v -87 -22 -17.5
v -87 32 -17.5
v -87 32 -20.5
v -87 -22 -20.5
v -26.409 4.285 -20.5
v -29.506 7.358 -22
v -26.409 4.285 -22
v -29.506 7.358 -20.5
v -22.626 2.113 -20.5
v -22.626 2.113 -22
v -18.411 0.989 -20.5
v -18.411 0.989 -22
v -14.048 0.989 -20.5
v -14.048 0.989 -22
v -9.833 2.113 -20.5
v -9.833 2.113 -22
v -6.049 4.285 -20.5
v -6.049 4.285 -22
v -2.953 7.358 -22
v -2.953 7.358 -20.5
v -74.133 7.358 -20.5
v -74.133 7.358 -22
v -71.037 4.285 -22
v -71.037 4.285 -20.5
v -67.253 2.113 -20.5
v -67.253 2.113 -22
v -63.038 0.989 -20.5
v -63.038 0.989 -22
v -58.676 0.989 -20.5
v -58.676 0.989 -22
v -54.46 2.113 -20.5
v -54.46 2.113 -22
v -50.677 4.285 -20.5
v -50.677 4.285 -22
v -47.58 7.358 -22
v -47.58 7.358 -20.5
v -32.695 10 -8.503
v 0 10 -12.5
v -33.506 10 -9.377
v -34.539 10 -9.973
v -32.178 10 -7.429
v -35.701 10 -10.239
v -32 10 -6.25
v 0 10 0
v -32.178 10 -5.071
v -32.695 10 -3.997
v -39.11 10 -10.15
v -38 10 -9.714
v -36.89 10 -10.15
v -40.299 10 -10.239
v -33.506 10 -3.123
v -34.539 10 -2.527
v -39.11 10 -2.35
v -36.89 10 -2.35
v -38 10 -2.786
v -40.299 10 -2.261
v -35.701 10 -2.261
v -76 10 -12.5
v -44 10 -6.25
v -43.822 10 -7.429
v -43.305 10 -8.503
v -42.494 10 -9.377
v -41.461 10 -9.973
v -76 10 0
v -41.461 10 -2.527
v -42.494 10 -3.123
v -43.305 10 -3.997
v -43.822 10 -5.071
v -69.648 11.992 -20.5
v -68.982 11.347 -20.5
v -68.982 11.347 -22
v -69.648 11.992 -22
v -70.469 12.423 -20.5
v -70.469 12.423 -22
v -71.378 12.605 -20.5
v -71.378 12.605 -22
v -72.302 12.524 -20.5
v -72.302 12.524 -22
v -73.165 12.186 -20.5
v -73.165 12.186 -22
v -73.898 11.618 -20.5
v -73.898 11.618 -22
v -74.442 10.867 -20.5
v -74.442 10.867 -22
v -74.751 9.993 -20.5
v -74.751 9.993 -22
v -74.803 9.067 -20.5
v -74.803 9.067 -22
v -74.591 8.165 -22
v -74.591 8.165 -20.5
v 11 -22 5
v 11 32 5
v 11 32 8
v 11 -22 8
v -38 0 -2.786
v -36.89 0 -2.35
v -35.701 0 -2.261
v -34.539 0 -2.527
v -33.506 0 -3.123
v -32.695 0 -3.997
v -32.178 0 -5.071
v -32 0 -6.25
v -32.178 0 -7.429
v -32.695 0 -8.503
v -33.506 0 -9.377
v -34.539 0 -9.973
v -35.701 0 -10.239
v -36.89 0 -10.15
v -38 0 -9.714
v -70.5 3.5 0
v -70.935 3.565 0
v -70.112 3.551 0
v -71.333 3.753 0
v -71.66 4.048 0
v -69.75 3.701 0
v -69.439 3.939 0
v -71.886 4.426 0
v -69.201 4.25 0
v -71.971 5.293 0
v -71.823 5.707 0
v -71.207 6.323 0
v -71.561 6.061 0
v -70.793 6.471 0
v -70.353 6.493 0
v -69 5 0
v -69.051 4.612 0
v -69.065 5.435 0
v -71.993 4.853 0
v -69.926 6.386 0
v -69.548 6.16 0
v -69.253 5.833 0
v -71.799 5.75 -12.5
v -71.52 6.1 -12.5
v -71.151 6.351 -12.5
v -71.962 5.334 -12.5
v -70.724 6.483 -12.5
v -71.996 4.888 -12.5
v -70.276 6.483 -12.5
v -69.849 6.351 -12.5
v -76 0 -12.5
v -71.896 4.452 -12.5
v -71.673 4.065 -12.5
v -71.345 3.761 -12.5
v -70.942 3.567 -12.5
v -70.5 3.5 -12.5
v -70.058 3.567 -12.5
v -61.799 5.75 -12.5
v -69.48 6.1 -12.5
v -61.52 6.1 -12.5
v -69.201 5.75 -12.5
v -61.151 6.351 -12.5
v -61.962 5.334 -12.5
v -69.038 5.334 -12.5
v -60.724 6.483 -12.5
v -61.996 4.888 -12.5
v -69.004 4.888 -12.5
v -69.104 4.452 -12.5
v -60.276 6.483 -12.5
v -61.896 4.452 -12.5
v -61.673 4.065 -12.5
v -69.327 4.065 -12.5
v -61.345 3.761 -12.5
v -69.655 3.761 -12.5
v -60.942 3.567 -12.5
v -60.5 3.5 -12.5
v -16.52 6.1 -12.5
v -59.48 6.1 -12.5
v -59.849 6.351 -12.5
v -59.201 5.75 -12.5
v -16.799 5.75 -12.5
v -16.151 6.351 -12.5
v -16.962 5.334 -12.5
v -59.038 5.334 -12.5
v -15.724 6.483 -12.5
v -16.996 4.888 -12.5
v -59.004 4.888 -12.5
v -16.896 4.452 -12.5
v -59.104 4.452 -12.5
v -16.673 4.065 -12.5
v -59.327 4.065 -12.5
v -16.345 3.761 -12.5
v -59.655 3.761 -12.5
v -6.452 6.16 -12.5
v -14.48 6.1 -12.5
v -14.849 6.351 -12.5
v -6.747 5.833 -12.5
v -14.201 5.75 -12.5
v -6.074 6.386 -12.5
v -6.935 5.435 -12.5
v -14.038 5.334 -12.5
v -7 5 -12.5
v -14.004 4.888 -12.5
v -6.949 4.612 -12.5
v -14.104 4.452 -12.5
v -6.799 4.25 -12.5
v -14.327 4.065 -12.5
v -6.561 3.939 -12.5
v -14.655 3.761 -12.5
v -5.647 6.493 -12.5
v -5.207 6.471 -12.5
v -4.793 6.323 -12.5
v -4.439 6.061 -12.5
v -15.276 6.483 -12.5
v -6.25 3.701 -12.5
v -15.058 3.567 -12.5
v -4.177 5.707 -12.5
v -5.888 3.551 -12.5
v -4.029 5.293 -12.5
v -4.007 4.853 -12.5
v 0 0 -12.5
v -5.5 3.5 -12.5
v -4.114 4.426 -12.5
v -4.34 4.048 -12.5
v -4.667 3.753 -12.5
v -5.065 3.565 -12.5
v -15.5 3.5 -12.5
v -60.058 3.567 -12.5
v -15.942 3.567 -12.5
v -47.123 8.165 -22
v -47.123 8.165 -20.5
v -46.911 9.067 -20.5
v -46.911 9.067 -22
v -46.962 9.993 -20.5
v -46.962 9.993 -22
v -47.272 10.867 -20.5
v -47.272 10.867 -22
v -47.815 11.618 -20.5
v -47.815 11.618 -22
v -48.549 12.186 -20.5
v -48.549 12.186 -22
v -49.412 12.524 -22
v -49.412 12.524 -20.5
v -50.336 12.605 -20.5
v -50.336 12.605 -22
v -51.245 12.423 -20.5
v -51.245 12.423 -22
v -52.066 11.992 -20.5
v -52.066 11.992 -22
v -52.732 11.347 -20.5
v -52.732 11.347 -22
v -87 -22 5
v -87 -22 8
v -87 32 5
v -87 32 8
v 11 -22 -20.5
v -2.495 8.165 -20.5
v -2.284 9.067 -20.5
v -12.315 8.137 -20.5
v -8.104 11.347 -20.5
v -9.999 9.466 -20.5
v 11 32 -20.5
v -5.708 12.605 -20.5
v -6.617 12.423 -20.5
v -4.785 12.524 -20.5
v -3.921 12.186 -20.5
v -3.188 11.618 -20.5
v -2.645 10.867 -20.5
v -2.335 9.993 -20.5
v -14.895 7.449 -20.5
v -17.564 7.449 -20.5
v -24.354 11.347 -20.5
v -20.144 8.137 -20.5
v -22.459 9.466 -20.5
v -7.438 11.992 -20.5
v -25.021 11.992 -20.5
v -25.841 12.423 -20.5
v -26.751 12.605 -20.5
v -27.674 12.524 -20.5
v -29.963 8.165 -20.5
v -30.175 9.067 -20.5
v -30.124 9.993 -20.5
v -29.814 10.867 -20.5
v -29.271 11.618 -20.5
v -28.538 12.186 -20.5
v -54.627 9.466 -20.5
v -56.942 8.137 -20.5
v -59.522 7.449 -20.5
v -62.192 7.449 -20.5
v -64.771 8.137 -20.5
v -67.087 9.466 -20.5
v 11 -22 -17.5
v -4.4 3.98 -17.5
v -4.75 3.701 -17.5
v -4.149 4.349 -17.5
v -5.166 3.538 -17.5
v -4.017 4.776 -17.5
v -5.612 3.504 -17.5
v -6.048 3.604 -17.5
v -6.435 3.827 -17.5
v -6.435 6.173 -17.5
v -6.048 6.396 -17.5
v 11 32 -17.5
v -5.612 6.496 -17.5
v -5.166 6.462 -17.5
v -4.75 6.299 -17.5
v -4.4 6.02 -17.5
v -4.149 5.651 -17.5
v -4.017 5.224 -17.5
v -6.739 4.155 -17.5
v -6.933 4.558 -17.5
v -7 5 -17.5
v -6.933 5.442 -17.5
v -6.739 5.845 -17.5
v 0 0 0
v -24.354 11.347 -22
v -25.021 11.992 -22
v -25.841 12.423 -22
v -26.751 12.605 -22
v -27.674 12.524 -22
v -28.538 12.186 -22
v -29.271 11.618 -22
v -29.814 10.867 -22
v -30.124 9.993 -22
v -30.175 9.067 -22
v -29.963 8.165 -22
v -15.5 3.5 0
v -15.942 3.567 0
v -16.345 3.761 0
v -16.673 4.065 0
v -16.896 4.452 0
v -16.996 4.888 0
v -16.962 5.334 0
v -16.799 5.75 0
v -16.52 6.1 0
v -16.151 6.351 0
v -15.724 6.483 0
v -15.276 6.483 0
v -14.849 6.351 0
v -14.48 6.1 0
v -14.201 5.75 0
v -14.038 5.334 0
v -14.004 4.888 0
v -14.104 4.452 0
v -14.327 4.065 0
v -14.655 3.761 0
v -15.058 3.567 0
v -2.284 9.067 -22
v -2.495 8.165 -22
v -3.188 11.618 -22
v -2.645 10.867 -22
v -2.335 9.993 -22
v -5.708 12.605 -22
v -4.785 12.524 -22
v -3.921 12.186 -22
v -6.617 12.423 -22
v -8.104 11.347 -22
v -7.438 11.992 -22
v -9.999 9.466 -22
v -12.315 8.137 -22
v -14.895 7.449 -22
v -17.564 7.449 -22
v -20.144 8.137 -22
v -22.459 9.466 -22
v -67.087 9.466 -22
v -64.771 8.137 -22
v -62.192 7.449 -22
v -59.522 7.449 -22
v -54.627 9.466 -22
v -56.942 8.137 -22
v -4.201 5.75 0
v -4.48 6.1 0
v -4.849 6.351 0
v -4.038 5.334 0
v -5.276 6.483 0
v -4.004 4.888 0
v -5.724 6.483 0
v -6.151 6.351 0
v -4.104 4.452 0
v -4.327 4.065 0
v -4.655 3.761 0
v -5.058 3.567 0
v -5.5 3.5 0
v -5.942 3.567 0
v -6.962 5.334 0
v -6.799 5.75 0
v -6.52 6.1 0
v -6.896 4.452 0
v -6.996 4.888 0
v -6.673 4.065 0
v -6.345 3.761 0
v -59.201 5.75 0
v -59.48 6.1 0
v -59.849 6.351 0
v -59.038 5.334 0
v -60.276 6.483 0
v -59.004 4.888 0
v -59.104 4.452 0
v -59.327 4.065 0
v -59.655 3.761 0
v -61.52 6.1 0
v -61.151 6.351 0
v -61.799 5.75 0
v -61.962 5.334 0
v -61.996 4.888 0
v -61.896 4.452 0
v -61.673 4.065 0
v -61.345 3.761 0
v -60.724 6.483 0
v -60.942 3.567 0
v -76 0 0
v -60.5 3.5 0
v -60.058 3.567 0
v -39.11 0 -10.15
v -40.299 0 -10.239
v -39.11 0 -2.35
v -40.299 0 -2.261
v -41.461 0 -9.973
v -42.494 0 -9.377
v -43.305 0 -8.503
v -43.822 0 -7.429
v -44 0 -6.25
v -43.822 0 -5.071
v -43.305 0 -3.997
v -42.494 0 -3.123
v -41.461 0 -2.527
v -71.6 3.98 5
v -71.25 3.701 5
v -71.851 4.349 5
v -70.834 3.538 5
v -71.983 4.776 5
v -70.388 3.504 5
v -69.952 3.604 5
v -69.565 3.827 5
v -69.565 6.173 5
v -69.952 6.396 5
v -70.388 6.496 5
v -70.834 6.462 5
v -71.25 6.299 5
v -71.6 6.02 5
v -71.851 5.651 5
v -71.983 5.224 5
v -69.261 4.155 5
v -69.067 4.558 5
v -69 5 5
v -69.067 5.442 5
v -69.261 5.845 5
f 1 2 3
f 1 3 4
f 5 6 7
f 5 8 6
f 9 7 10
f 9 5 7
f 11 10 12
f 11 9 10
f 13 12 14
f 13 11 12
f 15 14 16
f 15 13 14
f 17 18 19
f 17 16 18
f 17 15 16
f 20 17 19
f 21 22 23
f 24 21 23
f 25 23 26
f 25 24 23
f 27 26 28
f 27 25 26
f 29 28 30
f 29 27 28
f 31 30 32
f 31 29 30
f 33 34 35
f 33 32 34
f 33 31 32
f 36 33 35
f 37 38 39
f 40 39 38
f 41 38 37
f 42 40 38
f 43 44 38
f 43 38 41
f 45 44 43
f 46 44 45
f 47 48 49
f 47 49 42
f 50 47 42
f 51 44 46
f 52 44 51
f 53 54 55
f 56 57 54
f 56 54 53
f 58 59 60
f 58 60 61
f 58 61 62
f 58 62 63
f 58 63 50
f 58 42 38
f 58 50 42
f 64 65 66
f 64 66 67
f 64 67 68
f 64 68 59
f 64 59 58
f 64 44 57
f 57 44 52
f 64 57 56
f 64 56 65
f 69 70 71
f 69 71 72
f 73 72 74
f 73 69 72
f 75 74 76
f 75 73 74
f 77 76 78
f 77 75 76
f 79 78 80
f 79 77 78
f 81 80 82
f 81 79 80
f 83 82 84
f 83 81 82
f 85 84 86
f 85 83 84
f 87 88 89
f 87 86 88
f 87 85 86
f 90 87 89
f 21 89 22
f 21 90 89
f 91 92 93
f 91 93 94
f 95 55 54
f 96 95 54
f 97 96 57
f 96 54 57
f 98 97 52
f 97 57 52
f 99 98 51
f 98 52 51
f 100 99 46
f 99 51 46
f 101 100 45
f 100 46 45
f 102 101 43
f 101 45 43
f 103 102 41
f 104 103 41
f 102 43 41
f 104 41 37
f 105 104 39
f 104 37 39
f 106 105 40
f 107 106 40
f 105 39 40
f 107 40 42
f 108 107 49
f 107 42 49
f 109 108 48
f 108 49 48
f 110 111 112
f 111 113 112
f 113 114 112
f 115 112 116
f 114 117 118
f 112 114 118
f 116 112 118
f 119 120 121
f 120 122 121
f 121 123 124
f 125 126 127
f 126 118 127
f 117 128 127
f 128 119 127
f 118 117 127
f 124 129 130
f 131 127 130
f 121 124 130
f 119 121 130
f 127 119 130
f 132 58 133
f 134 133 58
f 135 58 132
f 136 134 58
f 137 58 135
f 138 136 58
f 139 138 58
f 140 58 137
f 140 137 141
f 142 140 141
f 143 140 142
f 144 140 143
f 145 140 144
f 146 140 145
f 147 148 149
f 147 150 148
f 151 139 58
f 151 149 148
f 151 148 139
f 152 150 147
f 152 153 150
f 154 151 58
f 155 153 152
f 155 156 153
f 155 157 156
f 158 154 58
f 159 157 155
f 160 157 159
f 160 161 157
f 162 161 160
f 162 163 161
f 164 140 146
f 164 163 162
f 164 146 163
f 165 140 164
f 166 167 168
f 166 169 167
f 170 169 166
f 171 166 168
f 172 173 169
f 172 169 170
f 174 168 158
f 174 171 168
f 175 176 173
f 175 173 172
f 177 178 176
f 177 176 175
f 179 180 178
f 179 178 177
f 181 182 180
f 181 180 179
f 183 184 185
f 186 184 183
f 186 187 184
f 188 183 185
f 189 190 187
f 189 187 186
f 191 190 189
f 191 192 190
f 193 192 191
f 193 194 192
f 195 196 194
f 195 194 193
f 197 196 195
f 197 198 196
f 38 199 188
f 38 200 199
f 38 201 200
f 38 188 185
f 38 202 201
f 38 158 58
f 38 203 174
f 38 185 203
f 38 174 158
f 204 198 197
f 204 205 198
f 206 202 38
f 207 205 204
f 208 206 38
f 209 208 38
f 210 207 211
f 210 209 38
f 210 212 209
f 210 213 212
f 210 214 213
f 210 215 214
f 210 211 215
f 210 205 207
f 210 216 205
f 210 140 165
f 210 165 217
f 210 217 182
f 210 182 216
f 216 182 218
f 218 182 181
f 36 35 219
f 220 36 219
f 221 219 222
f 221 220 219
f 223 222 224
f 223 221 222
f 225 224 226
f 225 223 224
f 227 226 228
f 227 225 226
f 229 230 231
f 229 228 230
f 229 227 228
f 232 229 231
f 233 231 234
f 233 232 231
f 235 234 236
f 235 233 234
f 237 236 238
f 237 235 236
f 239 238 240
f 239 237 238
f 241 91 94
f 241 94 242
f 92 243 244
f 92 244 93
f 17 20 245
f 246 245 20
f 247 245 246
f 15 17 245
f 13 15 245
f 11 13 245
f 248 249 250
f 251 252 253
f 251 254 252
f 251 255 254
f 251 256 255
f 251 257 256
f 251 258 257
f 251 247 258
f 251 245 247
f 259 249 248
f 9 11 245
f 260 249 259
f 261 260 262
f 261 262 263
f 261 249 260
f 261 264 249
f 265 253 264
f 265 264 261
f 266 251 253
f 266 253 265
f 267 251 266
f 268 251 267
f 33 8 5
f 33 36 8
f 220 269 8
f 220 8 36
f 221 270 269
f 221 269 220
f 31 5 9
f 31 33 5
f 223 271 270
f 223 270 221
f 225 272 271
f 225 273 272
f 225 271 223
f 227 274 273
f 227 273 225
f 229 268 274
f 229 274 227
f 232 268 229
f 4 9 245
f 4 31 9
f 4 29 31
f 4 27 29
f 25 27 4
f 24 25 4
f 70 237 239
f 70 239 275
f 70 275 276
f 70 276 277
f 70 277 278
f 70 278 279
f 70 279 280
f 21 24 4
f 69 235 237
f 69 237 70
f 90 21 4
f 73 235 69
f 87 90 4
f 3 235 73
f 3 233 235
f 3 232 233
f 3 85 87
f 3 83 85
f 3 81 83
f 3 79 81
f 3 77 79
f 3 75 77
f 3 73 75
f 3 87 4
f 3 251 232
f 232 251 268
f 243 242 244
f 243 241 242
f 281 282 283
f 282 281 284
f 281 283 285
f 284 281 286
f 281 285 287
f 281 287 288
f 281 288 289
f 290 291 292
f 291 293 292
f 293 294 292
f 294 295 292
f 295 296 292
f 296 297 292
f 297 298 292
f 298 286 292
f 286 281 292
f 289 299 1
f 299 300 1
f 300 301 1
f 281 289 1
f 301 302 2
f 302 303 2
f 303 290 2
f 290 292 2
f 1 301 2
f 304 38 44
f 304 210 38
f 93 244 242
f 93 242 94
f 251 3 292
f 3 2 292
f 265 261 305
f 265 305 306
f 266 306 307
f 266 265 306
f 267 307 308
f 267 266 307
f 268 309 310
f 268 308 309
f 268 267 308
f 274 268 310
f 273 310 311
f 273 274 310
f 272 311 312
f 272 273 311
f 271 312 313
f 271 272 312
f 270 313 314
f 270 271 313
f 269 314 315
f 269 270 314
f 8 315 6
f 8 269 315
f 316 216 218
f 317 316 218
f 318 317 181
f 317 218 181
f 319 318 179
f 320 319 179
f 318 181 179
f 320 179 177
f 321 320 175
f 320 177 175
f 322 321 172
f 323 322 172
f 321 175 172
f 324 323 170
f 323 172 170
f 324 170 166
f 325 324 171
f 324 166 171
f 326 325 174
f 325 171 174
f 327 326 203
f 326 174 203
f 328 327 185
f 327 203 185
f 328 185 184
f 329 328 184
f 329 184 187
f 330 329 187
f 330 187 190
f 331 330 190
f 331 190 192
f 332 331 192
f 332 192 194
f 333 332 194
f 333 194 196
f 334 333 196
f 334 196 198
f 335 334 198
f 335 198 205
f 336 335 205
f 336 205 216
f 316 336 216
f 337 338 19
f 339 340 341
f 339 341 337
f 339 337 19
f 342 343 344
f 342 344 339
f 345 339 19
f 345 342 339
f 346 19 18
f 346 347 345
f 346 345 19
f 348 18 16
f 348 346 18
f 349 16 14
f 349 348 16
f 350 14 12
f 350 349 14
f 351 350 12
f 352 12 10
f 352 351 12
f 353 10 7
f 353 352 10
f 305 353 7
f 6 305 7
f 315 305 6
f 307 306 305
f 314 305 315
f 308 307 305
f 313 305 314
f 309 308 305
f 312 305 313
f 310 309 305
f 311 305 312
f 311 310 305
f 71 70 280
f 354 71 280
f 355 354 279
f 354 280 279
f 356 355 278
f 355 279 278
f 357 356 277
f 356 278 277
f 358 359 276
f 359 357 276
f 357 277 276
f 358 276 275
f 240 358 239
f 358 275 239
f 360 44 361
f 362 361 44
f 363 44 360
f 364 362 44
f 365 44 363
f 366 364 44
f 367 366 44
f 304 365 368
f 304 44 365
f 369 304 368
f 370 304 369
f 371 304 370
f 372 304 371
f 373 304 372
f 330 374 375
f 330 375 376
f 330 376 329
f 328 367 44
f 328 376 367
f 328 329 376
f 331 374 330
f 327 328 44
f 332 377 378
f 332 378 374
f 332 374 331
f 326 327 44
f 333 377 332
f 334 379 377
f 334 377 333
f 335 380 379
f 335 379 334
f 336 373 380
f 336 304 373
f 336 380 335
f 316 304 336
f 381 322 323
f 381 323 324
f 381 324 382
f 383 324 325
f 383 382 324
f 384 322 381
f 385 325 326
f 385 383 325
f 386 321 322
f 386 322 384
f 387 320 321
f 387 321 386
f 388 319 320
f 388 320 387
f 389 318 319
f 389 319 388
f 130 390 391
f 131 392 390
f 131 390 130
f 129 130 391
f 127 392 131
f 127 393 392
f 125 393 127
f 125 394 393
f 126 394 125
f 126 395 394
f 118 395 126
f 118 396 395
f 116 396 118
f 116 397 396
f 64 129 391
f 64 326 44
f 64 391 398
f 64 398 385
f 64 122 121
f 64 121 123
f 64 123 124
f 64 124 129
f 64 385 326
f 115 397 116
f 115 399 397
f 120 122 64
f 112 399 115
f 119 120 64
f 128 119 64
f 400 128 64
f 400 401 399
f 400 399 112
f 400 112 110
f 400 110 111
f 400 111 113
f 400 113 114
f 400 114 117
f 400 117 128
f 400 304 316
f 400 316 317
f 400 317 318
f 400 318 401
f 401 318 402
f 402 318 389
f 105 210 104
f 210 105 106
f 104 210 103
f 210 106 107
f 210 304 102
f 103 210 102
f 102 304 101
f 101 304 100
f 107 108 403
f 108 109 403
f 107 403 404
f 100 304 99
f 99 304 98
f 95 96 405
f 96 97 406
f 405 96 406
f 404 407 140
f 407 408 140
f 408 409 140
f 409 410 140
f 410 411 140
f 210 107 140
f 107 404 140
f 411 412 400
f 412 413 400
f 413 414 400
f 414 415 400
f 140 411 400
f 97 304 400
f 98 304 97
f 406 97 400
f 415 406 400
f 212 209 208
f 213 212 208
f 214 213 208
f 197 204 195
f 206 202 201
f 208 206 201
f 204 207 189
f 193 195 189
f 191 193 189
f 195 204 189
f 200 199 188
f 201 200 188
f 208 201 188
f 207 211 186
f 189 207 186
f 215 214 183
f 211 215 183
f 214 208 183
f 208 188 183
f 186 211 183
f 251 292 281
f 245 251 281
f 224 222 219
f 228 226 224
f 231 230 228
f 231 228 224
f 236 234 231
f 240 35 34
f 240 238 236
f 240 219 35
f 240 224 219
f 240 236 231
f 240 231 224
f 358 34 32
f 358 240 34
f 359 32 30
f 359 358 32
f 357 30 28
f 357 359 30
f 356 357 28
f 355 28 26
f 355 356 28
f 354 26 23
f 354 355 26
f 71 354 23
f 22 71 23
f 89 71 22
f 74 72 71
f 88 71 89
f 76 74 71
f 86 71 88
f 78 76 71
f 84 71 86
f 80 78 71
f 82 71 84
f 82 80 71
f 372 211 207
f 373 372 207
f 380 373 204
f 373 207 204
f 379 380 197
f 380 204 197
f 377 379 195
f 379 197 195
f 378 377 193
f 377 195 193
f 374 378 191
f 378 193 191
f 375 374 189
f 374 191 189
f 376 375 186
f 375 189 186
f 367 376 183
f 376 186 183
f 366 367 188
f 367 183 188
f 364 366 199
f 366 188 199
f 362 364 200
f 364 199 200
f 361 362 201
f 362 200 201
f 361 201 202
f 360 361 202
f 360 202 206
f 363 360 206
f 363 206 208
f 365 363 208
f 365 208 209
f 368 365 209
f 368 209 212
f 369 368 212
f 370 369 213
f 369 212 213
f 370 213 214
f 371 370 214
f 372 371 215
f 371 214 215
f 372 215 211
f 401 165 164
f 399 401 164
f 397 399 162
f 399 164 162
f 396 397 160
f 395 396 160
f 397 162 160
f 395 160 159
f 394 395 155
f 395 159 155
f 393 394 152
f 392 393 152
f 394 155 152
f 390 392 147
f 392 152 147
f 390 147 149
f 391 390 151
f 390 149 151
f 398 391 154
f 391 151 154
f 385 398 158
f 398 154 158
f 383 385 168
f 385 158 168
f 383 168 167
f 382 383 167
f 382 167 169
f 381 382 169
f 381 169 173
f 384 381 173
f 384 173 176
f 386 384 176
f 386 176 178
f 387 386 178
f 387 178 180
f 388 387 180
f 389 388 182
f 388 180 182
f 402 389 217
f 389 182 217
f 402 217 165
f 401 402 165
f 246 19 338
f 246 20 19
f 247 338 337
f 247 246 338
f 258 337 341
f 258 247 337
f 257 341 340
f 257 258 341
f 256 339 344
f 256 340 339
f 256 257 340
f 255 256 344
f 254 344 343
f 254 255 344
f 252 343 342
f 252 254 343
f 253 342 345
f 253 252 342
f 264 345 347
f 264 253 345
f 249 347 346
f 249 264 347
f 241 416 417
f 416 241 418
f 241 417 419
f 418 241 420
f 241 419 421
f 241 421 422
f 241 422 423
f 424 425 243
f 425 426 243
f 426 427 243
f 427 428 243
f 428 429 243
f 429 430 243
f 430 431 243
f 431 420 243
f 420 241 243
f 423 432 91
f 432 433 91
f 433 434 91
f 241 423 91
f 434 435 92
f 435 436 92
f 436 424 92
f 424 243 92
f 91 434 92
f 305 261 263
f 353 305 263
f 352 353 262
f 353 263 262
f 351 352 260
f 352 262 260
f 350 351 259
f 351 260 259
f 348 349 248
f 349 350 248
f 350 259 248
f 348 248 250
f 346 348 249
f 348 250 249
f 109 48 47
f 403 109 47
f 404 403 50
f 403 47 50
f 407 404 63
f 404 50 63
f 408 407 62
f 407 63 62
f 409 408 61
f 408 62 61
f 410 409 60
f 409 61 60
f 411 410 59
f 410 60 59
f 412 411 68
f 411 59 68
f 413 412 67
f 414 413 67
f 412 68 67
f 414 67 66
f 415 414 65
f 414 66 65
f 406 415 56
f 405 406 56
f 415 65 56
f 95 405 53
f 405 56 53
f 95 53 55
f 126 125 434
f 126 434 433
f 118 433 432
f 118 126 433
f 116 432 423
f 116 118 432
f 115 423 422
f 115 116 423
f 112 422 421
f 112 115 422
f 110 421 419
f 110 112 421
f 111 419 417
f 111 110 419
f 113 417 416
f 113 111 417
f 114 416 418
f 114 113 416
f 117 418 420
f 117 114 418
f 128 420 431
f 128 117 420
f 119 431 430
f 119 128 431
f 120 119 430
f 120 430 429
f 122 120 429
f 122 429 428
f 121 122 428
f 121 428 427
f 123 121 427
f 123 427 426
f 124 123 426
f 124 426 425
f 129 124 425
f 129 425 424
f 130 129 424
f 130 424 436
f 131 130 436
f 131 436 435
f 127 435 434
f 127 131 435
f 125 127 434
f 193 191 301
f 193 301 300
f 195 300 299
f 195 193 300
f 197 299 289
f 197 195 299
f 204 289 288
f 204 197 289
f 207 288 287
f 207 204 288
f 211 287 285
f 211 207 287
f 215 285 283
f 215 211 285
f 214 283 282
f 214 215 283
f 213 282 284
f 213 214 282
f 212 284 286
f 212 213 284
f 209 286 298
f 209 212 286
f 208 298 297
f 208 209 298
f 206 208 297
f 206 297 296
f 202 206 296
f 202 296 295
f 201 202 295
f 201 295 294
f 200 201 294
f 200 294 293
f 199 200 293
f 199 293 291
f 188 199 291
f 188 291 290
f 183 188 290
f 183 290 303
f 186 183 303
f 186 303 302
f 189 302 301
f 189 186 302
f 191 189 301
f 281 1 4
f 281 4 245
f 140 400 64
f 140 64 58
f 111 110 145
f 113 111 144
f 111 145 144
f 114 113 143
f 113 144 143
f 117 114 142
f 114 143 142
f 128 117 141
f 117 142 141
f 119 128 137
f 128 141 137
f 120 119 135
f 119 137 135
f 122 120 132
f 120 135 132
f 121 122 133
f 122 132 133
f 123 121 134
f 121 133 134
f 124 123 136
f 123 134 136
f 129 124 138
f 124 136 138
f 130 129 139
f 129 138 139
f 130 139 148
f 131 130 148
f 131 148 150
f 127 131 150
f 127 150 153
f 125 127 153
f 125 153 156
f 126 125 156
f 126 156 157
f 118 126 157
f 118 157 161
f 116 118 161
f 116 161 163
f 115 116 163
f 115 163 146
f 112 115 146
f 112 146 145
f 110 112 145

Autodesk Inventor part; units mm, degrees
ref_plane "YZ Plane" through (0, 0, 0) normal (1, 0, 0) x (0, 1, 0)
ref_plane "XZ Plane" through (0, 0, 0) normal (0, 1, 0) x (-1, 0, 0)
ref_plane "XY Plane" through (0, 0, 0) normal (0, 0, 1) x (1, 0, 0)
sketch "loadcell" plane through (0, 0, 0) normal (0, 1, 0) x (-1, 0, 0)
  line L0 (0, 0) -> (76, 0)
  line L1 (76, 0) -> (76, -12.5)
  line L2 (76, -12.5) -> (0, -12.5)
  line L3 (0, -12.5) -> (0, 0)
  point P0 (38, -6.25)
  dimension "d0" = 76
  dimension "d1" = 12.5
extrude "Base" add sketch "loadcell" along normal blind 10
sketch "Sketch3" plane through (0, 10, 0) normal (0, 1, 0) x (1, 0, 0)
  line L0 (-76, 12.5) -> (-76, 0) projected
  line L1 (-76, 6.25) -> (0, 6.25)
  line L2 (0, 12.5) -> (-76, 12.5) projected
  line L3 (-38, 12.5) -> (-38, 0)
  circle A0 centre (-36, 6.25) radius 4
  circle A1 centre (-40, 6.25) radius 4
  point P0 (0, 0)
  point P1 (-38, 6.25)
  point P2 (-38, 9.7141)
  point P3 (-38, 6.25)
  dimension "d4" = 8
  dimension "d5" = 8
  dimension "d8" = 2
  dimension "d9" = 2
extrude "Furo" cut sketch "Sketch3" against normal blind 10 contours A1 A0 L1 | L1 A0 A1 | A1 L1 L3 | L3 L1 A0 | A0 L1 A1 | L1 L3 A0 | A1 L1 A0 | L3 L1 A1
sketch "Sketch2" plane through (0, 10, 0) normal (0, 1, 0) x (1, 0, 0)
  line L0 (-76, 12.5) -> (-76, 0) projected
  line L1 (0, 0) -> (0, 12.5) projected
  point P0 (-38, 6.25)
sketch "Sketch4" plane through (-76, 0, 0) normal (0, 0, 1) x (1, 0, 0)
  line L0 (76, 0) -> (76, 10) projected
  line L1 (0, 0) -> (0, 10) projected
  line L2 (76, 10) -> (0, 10) projected
  line L3 (76, 0) -> (0, 0) projected
  line L4 (0, 0) -> (0, 10) projected
  line L5 (38, 10) -> (38, 0)
  point P0 (38, 5)
  point P1 (5.5, 5)
  point P2 (15.5, 5)
  point P3 (0, 5)
  point P4 (0, 5)
  point P5 (70.5, 5)
  point P6 (60.5, 5)
  dimension "d12" = 5.5
  dimension "d13" = 15.5
hole "Hole1" at (-70.5, 5, 0) at (-60.5, 5, 0) direction (0, 0, -1) diameter 3 end through all
thread "Thread1" size "M3x0.5" class "6H" standard "ANSI Metric M Profile" full length
thread "Thread2" size "M3x0.5" class "6H" standard "ANSI Metric M Profile" full length
thread "Thread3" size "M3x0.5" class "6H" standard "ANSI Metric M Profile" full length
hole "Hole2" at (-15.5, 5, 0) at (-5.5, 5, 0) direction (0, 0, -1) diameter 3 end through all
thread "Thread4" size "M3x0.5" class "6H" standard "ANSI Metric M Profile" full length
thread "Thread5" size "M3x0.5" class "6H" standard "ANSI Metric M Profile" full length
sketch "pino_de_baixo" plane through (-76, 0, 0) normal (0, 0, 1) x (1, 0, 0)
  circle A0 centre (5.5, 5) radius 1.5 projected
  circle A1 centre (5.5, 5) radius 1.5
  point P0 (76, 0)
extrude "parafuso/pino" add sketch "pino_de_baixo" along normal blind 5
sketch "Sketch6" plane through (-70.5, 5, 5) normal (0, 0, 1) x (1, 0, 0)
  line L0 (-16.5, 27) -> (81.5, 27)
  line L1 (81.5, 27) -> (81.5, -27)
  line L2 (81.5, -27) -> (-16.5, -27)
  line L3 (-16.5, -27) -> (-16.5, 27)
  dimension "d48" = 98
  dimension "d49" = 54
extrude "Extrusion4" add sketch "Sketch6" along normal blind 3
sketch "pino/furo/ima" plane through (0, 0, -12.5) normal (0, 0, -1) x (-1, 0, 0)
  circle A0 centre (5.5, 5) radius 1.5 projected
  circle A1 centre (5.5, 5) radius 1.5
  point P0 (0, 0)
extrude "Extrusion5" add sketch "pino/furo/ima" along normal blind 5
sketch "Sketch8" plane through (-5.5, 5, -17.5) normal (0, 0, -1) x (-1, 0, 0)
  line L0 (81.5, -27) -> (-16.5, -27) projected
  line L1 (81.5, 27) -> (81.5, -27) projected
  line L2 (-16.5, -27) -> (81.5, -27)
  line L3 (81.5, -27) -> (81.5, 27)
  line L4 (81.5, 27) -> (-16.5, 27)
  line L5 (-16.5, 27) -> (-16.5, -27)
  point P0 (-5.5, -5)
extrude "Extrusion6" add sketch "Sketch8" along normal blind 3
sketch "ima-neodimio" plane through (-5.5, 5, -20.5) normal (0, 0, -1) x (-1, 0, 0)
  line L0 (32.5, 5) -> (32.5, -5) projected
  arc A0 (12.0929, -3.2123) -> (33.5362, -3.1801) centre (22.8022, 5.0619) ccw construction
  arc A1 (-2.547, 2.3582) -> (24.0058, 2.3582) centre (10.7294, 12.6379) ccw
  arc A2 (2.6045, 6.3469) -> (18.8543, 6.3469) centre (10.7294, 12.6379) ccw
  arc A3 (2.6045, 6.3469) -> (-2.547, 2.3582) centre (0.0287, 4.3526) ccw
  arc A4 (24.0058, 2.3582) -> (18.8543, 6.3469) centre (21.4301, 4.3526) ccw
  arc A5 (56.7203, -3.2123) -> (78.1636, -3.1801) centre (67.4295, 5.0619) ccw construction
  arc A6 (42.0804, 2.3582) -> (68.6332, 2.3582) centre (55.3568, 12.6379) ccw
  arc A7 (47.2319, 6.3469) -> (63.4817, 6.3469) centre (55.3568, 12.6379) ccw
  arc A8 (47.2319, 6.3469) -> (42.0804, 2.3582) centre (44.6561, 4.3526) ccw
  arc A9 (68.6332, 2.3582) -> (63.4817, 6.3469) centre (66.0575, 4.3526) ccw
extrude "Extrusion7" add sketch "ima-neodimio" along normal blind 1.5
properties part number "load_cell" material "Acetal Resin, Black"
